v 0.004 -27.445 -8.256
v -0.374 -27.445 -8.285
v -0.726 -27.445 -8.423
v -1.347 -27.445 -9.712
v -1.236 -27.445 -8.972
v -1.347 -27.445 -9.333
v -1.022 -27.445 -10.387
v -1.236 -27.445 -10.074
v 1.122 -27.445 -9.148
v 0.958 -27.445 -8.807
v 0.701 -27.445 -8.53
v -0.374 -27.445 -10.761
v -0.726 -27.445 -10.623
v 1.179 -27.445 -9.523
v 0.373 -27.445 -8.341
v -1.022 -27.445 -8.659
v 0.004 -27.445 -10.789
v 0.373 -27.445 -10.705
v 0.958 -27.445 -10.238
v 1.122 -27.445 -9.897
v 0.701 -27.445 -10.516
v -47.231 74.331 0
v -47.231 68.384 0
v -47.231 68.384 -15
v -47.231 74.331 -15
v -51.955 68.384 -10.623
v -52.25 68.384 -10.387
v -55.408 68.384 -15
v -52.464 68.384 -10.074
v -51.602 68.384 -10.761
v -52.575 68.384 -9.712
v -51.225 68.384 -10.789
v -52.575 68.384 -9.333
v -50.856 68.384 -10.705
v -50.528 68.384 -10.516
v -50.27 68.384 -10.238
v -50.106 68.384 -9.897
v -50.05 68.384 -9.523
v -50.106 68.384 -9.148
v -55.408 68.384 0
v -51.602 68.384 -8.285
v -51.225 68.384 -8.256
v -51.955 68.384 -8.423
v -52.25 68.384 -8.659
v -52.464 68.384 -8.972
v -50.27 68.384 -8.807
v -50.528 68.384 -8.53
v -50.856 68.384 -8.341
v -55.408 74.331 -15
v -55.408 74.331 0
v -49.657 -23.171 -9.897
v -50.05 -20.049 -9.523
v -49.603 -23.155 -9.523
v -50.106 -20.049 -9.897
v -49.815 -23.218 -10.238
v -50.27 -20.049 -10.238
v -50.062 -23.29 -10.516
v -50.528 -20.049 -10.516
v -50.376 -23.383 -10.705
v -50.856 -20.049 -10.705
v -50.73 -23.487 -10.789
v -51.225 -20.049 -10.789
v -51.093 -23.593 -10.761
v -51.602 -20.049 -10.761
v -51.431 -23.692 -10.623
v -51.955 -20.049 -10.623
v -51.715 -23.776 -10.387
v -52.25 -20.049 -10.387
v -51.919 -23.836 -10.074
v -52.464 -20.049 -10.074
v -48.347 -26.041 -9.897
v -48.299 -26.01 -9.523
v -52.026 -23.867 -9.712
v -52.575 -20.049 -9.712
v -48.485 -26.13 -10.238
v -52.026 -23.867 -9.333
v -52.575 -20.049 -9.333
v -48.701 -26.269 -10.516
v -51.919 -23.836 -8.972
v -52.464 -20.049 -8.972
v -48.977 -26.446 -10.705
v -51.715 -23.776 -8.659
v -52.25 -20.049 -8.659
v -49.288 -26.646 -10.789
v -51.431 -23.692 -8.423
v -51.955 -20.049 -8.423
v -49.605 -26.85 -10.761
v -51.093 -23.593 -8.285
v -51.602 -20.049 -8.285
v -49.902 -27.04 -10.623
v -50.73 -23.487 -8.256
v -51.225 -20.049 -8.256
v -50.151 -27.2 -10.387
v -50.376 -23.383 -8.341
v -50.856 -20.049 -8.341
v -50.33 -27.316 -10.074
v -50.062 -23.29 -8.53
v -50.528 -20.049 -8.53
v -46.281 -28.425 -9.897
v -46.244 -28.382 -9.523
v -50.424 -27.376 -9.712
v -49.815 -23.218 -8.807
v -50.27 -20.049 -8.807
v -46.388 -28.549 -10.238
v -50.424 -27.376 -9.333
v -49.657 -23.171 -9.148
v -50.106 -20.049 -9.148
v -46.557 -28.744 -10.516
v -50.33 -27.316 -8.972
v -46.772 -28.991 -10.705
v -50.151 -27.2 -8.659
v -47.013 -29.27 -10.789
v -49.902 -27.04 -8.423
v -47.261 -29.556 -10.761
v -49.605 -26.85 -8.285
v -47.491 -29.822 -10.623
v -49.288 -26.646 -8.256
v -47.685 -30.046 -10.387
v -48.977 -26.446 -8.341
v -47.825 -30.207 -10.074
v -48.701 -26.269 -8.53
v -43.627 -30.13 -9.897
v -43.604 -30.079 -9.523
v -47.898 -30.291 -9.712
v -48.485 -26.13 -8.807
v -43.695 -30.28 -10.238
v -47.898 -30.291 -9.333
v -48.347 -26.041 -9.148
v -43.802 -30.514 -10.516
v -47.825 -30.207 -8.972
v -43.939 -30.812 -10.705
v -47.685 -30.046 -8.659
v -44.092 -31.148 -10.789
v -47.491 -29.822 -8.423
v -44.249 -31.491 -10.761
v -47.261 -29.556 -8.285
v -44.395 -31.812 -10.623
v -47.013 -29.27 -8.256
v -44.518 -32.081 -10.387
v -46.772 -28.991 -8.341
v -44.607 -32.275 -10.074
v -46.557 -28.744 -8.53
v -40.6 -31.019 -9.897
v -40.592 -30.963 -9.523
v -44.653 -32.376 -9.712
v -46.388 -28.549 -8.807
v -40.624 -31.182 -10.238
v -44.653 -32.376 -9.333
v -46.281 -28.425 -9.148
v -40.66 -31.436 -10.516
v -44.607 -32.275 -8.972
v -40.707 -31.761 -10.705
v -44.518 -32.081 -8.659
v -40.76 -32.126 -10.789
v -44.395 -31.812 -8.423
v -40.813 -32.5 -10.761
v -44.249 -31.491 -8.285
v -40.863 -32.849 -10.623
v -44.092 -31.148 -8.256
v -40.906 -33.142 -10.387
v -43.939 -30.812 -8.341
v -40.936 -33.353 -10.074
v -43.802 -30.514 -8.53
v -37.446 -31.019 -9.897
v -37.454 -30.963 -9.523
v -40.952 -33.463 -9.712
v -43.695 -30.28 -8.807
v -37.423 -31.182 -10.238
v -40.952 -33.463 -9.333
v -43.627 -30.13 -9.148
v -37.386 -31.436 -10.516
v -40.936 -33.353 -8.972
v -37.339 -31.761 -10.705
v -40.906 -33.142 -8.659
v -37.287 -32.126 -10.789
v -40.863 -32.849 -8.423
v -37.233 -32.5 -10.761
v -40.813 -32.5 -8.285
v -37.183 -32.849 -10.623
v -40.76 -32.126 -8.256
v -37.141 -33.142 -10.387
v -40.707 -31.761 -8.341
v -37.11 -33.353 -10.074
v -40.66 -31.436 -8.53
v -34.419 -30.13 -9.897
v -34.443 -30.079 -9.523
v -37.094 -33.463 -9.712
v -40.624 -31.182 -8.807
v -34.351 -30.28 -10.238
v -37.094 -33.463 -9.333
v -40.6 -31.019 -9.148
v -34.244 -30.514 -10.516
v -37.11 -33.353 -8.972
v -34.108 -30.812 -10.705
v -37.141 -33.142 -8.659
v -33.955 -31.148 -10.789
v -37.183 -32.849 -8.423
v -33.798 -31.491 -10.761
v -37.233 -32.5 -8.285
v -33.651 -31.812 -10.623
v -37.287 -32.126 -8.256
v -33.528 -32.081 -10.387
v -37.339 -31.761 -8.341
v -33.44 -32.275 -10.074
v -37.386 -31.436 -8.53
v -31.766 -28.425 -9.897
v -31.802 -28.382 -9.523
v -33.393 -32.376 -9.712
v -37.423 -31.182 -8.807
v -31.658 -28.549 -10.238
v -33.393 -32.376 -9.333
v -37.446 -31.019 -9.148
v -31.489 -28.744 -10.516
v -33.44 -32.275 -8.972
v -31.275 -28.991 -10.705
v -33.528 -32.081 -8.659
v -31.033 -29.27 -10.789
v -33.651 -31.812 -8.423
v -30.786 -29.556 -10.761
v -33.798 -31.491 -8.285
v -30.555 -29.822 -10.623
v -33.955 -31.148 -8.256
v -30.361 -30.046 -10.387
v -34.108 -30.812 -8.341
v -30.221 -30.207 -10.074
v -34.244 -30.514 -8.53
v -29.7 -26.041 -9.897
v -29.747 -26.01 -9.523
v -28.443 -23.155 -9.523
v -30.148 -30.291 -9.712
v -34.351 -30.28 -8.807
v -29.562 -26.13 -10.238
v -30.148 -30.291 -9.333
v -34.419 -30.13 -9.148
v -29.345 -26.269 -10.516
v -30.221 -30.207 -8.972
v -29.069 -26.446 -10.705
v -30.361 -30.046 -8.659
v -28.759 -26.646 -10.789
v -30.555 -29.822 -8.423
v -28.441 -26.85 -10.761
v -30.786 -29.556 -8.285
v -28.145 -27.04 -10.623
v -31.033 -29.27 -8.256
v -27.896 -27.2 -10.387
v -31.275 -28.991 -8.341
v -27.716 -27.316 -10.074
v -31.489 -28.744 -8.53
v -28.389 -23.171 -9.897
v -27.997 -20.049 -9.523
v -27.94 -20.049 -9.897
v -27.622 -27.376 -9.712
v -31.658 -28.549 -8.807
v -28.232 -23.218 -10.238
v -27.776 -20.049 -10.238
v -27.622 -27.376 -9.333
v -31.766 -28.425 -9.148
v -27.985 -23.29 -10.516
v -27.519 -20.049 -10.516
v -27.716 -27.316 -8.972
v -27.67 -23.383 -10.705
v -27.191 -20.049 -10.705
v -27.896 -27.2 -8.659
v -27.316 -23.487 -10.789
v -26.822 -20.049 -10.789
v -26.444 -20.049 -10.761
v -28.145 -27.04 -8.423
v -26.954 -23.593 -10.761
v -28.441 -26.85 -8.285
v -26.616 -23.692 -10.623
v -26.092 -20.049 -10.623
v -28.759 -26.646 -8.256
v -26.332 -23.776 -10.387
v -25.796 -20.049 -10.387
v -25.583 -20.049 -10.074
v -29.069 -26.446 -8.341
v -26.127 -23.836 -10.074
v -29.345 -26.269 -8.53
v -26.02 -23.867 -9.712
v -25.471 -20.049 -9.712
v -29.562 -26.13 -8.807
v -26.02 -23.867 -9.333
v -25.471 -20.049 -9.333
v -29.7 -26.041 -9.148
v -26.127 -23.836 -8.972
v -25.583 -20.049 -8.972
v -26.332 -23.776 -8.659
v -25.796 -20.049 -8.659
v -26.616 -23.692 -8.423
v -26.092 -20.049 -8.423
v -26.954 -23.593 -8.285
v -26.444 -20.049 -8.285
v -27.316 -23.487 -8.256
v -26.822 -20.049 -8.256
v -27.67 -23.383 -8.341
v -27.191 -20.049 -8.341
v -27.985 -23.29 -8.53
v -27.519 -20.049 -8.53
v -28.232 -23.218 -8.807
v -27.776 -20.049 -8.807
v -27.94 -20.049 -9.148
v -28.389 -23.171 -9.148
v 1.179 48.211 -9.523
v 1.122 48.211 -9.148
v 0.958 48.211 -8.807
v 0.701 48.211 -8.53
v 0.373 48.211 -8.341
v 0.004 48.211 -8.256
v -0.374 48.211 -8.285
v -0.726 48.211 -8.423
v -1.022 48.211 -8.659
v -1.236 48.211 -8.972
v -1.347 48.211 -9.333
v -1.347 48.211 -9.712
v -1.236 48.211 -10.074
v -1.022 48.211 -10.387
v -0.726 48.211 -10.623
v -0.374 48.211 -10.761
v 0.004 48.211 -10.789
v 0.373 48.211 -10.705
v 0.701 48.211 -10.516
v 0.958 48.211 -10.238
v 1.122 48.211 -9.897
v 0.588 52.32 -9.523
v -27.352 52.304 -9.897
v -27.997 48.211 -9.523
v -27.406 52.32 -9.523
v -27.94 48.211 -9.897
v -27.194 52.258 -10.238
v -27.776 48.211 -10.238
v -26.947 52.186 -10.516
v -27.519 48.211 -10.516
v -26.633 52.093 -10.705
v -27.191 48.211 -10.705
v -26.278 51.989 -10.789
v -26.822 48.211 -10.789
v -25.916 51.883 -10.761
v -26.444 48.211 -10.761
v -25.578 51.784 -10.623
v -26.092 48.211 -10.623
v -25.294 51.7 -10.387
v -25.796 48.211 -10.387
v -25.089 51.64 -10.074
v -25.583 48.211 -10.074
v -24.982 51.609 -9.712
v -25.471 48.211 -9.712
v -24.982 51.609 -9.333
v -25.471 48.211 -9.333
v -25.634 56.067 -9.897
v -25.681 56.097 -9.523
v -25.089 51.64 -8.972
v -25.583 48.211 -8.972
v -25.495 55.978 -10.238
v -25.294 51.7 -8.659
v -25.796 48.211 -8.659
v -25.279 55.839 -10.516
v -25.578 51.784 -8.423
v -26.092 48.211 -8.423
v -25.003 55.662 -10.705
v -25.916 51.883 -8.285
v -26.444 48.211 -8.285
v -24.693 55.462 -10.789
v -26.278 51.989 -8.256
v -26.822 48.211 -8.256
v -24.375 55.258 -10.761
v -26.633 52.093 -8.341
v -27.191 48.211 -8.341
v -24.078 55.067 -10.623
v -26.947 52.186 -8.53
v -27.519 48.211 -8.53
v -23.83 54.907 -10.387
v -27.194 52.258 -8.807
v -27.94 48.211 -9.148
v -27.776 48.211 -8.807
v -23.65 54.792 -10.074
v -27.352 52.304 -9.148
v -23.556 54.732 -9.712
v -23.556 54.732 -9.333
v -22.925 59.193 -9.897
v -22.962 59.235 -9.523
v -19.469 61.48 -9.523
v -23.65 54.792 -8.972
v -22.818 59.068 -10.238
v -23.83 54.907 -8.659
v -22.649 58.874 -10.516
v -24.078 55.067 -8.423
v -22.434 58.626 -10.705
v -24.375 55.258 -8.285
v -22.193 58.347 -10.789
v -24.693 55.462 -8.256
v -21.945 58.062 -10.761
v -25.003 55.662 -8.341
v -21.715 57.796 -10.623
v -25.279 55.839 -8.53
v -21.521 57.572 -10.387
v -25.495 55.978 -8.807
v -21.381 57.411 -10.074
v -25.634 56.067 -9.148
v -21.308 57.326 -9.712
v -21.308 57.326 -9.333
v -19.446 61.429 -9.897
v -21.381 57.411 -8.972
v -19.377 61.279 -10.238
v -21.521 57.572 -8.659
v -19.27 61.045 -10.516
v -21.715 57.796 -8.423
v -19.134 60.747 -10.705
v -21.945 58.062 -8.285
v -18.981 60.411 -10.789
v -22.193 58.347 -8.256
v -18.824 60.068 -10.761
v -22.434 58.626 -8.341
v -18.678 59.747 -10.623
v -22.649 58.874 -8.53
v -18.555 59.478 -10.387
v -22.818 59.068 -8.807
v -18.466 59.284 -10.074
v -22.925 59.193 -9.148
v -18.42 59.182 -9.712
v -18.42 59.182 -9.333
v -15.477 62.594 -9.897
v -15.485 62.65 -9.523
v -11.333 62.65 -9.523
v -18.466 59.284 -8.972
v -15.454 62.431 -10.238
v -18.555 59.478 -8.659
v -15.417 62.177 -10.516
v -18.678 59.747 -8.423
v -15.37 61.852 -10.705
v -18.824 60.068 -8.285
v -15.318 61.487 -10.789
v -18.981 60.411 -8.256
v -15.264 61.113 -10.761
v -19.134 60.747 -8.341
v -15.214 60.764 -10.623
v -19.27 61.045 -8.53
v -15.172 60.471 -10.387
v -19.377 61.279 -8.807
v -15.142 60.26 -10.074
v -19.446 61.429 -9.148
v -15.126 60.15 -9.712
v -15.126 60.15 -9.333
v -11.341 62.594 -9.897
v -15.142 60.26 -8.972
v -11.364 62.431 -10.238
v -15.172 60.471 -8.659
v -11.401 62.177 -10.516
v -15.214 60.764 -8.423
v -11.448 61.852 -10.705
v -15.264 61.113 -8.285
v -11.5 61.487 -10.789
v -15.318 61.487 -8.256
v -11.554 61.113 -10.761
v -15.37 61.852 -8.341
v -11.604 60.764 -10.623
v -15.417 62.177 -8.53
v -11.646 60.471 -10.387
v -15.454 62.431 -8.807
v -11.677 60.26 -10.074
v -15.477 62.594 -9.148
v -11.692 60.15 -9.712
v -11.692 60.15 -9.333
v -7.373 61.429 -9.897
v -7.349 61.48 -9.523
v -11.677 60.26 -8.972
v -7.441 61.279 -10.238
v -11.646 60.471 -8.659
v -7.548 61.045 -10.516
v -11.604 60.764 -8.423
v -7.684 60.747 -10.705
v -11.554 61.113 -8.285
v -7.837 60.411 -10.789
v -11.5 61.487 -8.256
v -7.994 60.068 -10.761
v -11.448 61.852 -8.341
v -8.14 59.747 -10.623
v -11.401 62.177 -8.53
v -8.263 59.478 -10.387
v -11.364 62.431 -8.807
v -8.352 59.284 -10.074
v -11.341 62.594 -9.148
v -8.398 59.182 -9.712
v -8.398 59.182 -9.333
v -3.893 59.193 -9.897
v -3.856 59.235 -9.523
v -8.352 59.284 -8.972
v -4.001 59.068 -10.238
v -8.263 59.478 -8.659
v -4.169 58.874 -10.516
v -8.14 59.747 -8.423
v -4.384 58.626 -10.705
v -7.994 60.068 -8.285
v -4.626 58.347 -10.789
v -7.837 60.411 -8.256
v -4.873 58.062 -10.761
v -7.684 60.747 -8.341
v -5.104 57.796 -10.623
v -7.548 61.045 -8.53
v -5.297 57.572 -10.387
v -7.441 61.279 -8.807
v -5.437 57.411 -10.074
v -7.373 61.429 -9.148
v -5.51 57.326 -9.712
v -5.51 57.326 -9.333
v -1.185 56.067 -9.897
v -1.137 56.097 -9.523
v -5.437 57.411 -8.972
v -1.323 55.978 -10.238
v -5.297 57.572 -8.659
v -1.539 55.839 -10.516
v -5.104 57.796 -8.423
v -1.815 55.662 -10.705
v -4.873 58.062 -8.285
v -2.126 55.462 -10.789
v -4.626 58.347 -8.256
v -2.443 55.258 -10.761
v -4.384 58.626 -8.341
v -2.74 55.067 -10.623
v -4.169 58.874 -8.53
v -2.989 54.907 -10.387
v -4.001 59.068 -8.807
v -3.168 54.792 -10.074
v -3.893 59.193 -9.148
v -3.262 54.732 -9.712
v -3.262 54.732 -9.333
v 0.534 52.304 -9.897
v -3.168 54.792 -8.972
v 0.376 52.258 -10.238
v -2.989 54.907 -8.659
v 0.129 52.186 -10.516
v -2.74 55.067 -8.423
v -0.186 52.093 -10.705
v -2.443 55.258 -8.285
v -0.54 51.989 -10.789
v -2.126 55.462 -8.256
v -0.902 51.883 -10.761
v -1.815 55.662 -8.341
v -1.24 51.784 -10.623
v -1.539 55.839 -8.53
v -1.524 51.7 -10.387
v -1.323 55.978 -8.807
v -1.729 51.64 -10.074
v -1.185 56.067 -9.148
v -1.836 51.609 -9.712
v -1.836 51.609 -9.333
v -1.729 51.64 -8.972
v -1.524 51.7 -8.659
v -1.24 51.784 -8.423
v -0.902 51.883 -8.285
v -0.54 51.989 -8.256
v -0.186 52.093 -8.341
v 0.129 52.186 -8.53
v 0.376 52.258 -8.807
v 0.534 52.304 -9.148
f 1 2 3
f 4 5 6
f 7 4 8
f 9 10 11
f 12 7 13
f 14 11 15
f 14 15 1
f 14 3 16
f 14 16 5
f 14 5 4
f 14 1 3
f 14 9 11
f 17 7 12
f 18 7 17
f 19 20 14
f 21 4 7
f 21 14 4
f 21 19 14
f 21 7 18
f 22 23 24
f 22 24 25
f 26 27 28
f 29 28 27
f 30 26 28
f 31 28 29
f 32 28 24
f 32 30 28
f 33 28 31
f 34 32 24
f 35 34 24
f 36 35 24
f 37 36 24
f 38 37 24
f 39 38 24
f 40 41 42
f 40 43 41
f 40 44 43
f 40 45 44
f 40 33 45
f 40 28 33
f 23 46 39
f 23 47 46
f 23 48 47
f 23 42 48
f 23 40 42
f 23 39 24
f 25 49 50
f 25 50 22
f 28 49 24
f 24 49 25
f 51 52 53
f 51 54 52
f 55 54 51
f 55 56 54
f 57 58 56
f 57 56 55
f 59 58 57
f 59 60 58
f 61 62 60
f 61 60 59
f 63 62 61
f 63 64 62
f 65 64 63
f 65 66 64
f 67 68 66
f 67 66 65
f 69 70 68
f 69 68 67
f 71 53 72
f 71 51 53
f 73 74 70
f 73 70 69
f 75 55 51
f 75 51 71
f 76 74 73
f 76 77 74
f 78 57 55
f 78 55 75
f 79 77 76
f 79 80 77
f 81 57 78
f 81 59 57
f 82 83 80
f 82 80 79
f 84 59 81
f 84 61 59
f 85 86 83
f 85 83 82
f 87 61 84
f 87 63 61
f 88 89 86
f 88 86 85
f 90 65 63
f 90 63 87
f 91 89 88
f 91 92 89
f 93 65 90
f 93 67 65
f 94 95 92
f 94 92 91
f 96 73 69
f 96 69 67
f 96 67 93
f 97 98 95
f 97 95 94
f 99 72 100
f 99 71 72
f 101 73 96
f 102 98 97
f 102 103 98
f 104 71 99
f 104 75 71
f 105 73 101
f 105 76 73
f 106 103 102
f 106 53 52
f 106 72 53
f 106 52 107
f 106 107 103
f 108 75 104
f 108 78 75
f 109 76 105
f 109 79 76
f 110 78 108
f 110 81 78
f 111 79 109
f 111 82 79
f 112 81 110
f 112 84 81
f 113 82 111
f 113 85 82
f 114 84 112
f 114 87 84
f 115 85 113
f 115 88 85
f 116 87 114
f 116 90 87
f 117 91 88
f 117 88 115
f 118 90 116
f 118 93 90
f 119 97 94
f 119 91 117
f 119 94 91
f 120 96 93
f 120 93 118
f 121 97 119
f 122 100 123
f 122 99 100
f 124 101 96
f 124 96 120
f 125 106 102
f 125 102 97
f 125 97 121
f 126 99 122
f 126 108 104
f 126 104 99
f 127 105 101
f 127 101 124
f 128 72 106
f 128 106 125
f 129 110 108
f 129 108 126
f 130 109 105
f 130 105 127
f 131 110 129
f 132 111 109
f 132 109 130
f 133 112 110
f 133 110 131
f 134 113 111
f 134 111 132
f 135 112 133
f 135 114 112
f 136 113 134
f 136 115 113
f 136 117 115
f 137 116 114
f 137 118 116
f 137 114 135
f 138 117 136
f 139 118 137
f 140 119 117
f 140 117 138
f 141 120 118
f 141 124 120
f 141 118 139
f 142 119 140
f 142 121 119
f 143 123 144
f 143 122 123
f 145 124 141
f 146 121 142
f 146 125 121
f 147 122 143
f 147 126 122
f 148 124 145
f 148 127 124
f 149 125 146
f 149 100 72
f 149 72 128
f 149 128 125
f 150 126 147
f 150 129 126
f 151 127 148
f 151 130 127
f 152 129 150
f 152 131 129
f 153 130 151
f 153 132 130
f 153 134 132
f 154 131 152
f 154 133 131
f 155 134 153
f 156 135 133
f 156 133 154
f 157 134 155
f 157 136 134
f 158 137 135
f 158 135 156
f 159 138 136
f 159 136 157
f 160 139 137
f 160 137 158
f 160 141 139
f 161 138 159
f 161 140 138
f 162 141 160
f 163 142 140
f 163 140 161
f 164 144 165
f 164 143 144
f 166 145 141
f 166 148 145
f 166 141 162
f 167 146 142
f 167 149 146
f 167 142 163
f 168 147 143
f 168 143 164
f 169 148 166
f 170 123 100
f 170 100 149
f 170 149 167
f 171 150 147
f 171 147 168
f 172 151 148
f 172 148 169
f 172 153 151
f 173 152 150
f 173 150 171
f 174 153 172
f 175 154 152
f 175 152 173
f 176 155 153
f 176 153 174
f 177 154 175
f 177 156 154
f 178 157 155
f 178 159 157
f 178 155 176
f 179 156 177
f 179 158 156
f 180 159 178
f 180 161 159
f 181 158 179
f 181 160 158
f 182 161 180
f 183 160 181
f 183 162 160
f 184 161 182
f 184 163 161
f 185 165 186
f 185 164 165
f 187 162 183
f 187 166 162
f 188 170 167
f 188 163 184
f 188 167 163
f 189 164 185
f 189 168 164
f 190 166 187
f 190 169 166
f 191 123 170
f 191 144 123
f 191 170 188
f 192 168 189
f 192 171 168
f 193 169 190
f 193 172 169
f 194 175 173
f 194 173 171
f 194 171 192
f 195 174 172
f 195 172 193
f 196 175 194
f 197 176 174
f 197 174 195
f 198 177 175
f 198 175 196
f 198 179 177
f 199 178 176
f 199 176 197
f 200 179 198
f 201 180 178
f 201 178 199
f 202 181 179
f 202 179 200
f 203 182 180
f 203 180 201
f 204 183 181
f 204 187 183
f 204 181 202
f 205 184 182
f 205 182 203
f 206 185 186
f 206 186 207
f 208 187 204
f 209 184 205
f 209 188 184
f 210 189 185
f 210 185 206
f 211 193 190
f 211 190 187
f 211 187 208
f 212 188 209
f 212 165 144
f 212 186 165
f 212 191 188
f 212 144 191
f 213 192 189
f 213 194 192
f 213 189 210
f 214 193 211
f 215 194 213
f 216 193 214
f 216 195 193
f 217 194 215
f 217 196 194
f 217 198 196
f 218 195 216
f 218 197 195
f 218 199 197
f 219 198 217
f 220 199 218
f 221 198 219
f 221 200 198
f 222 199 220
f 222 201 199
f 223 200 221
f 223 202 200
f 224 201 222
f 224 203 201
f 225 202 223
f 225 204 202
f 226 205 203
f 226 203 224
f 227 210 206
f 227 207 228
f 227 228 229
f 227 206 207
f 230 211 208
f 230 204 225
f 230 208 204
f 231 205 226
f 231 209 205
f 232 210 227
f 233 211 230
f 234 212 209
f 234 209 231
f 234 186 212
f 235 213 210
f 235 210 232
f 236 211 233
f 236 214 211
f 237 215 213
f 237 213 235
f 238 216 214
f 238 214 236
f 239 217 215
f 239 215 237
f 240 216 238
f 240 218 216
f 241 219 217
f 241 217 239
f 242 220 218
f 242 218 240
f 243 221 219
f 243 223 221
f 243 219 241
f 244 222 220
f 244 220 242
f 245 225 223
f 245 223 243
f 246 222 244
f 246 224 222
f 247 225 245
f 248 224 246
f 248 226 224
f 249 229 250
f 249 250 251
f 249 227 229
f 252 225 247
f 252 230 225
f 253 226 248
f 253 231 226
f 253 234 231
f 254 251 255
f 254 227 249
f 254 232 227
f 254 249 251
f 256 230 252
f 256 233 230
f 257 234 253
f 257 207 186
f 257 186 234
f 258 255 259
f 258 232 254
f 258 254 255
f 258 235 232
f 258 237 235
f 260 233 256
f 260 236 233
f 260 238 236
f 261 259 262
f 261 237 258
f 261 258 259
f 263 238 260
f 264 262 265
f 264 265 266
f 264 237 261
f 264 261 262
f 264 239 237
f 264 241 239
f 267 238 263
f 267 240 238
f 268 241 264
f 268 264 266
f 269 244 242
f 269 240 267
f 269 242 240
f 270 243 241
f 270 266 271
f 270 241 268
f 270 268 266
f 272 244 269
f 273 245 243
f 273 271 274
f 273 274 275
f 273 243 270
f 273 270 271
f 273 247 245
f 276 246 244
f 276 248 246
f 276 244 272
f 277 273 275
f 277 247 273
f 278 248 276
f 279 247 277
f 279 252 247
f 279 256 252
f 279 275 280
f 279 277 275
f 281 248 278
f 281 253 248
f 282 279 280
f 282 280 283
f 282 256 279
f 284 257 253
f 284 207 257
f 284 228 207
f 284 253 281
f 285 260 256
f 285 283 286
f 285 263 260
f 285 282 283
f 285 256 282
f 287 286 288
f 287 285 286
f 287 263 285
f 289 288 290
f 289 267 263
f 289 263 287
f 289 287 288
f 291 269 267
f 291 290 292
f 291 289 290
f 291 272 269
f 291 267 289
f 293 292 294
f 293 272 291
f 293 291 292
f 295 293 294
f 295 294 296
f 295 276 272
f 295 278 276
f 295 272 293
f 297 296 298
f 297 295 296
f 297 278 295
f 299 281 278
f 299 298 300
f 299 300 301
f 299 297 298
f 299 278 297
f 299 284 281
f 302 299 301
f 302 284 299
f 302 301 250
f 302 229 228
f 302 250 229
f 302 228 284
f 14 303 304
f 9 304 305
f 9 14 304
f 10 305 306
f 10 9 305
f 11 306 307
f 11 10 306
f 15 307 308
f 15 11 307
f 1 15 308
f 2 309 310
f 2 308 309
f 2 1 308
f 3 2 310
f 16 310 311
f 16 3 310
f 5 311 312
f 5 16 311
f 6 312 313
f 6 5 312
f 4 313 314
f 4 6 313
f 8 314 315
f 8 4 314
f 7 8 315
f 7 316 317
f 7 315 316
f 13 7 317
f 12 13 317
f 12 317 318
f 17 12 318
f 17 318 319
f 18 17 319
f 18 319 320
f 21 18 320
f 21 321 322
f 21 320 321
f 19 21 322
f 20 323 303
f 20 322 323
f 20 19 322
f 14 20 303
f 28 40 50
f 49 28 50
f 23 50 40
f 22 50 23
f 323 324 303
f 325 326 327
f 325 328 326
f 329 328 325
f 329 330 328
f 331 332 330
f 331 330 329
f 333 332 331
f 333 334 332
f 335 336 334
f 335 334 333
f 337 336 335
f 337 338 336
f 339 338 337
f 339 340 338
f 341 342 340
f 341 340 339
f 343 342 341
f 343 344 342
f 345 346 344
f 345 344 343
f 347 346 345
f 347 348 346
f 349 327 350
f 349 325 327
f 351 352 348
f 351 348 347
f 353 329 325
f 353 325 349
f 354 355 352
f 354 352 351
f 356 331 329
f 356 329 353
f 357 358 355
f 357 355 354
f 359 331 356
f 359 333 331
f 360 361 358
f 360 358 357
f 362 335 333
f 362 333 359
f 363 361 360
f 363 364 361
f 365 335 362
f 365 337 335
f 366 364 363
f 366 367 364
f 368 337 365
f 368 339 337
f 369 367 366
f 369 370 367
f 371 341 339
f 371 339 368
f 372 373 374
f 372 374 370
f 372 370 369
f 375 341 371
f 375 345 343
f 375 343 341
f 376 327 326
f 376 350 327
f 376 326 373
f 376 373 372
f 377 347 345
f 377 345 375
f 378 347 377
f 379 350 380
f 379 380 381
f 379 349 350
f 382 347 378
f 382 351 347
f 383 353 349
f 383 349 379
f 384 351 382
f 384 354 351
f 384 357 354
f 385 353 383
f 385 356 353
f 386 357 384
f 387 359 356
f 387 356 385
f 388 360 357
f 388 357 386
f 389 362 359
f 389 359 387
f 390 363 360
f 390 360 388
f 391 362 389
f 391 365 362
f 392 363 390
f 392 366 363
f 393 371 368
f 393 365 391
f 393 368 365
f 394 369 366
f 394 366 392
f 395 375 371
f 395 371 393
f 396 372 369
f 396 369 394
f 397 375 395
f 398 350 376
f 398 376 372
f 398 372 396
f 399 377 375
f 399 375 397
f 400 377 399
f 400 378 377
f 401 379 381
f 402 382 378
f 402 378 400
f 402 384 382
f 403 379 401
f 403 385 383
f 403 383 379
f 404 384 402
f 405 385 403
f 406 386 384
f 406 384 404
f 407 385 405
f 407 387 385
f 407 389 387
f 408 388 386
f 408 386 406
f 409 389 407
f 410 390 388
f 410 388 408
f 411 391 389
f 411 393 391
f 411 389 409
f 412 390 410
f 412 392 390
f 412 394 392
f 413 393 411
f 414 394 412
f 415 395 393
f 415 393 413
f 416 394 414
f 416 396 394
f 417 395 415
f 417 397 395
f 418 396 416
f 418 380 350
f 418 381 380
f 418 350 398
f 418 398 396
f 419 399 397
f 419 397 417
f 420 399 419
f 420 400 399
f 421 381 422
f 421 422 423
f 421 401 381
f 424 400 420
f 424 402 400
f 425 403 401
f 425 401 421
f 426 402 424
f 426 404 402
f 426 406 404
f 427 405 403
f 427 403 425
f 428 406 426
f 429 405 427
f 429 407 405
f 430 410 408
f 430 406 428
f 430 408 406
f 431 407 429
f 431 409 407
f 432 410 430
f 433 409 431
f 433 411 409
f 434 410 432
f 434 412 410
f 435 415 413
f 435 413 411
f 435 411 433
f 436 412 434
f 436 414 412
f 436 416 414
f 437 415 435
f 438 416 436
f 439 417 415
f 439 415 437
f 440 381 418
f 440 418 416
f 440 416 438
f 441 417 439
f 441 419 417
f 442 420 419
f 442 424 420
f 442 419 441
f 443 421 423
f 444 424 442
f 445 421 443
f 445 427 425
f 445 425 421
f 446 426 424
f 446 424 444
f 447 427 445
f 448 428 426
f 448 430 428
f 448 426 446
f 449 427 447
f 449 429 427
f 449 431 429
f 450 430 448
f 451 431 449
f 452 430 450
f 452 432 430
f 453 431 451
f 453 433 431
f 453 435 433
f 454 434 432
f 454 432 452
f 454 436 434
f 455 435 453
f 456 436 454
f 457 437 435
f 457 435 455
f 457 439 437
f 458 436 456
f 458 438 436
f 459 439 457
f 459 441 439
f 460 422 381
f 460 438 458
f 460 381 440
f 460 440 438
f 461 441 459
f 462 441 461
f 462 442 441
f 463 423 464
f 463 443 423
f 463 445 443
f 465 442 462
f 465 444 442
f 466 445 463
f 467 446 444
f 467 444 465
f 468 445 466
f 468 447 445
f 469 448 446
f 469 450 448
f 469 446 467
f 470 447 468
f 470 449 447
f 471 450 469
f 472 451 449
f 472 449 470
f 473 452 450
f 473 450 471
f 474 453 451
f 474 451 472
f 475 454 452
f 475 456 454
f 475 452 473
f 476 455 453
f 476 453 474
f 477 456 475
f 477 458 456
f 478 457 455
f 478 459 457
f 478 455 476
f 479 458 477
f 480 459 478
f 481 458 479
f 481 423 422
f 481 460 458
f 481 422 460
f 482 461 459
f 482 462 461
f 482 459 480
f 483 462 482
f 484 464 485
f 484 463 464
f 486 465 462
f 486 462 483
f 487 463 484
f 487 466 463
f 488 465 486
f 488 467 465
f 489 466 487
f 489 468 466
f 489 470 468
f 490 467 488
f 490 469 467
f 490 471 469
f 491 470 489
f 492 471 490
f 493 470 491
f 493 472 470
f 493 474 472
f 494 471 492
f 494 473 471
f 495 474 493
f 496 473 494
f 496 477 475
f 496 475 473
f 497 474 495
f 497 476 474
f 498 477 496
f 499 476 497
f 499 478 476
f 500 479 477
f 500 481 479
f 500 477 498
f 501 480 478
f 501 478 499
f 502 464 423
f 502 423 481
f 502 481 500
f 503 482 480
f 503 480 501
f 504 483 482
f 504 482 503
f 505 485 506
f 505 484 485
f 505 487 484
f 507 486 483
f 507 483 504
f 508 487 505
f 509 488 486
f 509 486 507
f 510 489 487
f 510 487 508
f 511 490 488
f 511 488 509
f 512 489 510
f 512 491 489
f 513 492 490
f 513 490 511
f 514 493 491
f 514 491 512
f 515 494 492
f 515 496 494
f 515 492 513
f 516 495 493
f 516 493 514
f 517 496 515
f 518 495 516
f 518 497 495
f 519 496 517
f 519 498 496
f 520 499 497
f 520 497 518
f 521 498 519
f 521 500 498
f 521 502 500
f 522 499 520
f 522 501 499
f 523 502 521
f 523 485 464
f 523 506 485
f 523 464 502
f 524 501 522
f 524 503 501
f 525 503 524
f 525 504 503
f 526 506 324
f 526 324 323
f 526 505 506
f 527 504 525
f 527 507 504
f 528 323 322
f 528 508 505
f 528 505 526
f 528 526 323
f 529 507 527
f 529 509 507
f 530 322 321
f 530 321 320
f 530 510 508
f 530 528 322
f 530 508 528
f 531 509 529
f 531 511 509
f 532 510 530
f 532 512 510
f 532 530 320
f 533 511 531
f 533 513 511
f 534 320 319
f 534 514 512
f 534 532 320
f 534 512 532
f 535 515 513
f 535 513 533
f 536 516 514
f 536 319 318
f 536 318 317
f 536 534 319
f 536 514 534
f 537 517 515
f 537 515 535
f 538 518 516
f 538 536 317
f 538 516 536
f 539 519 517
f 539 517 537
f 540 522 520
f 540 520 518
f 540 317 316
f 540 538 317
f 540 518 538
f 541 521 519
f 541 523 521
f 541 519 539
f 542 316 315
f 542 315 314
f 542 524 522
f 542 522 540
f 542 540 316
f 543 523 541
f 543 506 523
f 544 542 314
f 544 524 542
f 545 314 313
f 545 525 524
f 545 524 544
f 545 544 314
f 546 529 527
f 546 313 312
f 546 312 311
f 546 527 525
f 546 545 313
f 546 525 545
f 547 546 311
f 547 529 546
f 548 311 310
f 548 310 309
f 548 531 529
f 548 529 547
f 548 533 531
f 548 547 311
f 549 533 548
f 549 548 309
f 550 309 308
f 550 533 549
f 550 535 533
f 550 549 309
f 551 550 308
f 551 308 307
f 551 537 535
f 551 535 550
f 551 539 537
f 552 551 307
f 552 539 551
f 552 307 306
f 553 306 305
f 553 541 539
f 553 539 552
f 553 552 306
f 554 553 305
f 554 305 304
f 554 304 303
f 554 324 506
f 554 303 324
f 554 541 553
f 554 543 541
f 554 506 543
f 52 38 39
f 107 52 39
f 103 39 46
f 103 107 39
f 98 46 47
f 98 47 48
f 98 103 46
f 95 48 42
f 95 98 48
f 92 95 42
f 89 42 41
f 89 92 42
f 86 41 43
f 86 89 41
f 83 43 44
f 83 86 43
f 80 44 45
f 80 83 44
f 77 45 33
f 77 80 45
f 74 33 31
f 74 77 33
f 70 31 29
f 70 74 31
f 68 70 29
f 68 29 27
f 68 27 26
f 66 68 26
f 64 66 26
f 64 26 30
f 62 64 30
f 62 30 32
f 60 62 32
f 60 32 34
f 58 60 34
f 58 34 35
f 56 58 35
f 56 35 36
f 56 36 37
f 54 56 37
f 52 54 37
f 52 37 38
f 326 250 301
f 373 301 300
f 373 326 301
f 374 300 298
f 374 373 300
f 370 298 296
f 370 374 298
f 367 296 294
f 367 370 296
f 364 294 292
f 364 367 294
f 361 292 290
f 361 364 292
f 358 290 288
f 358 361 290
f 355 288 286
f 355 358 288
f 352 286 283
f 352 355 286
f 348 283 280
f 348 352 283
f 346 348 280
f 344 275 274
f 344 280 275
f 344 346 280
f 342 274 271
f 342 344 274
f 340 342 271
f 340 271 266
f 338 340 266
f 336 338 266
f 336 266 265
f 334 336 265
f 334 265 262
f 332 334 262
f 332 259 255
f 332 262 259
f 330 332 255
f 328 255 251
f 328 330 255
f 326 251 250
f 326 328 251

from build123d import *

# Parameters (mm, degrees)
SKETCH1_W           = 8.177357898
SKETCH1_H           = 5.946767651
BOSS_EXTRUDE1_DEPTH = 15
SKETCH2_R           = 1.27


with BuildPart() as part:
    # Sketch1 → Boss-Extrude1 (new body)
    with BuildSketch(Plane.XY):
        with Locations((-51.319507827, 71.357432061)):
            Rectangle(SKETCH1_W, SKETCH1_H)
    extrude(amount=-BOSS_EXTRUDE1_DEPTH)

    # Sweep1: sweep along a path in Sketch3
    with BuildLine(Plane.XY.offset(-9.522776034)) as sweep1_path:
        Line((-51.319507827, 68.384048236), (-51.319507827, -20.048994445))
        ThreePointArc((-51.319507827, -20.048994445), (-39.023171295, -32.345330977), (-26.726834763, -20.048994445))
        Line((-26.726834763, -20.048994445), (-26.726834763, 48.210546245))
        ThreePointArc((-26.726834763, 48.210546245), (-13.409077555, 61.528303453), (-0.091320347, 48.210546245))
        Line((-0.091320347, 48.210546245), (-0.091320347, -27.444646548))
    # Sketch2 → Sweep1 (sweep)
    with BuildSketch(Plane.XZ.offset(-68.384048236)):
        with Locations((-51.319507827, -9.522776034)):
            Circle(SKETCH2_R)
    sweep(path=sweep1_path.line)


solid = part.part
